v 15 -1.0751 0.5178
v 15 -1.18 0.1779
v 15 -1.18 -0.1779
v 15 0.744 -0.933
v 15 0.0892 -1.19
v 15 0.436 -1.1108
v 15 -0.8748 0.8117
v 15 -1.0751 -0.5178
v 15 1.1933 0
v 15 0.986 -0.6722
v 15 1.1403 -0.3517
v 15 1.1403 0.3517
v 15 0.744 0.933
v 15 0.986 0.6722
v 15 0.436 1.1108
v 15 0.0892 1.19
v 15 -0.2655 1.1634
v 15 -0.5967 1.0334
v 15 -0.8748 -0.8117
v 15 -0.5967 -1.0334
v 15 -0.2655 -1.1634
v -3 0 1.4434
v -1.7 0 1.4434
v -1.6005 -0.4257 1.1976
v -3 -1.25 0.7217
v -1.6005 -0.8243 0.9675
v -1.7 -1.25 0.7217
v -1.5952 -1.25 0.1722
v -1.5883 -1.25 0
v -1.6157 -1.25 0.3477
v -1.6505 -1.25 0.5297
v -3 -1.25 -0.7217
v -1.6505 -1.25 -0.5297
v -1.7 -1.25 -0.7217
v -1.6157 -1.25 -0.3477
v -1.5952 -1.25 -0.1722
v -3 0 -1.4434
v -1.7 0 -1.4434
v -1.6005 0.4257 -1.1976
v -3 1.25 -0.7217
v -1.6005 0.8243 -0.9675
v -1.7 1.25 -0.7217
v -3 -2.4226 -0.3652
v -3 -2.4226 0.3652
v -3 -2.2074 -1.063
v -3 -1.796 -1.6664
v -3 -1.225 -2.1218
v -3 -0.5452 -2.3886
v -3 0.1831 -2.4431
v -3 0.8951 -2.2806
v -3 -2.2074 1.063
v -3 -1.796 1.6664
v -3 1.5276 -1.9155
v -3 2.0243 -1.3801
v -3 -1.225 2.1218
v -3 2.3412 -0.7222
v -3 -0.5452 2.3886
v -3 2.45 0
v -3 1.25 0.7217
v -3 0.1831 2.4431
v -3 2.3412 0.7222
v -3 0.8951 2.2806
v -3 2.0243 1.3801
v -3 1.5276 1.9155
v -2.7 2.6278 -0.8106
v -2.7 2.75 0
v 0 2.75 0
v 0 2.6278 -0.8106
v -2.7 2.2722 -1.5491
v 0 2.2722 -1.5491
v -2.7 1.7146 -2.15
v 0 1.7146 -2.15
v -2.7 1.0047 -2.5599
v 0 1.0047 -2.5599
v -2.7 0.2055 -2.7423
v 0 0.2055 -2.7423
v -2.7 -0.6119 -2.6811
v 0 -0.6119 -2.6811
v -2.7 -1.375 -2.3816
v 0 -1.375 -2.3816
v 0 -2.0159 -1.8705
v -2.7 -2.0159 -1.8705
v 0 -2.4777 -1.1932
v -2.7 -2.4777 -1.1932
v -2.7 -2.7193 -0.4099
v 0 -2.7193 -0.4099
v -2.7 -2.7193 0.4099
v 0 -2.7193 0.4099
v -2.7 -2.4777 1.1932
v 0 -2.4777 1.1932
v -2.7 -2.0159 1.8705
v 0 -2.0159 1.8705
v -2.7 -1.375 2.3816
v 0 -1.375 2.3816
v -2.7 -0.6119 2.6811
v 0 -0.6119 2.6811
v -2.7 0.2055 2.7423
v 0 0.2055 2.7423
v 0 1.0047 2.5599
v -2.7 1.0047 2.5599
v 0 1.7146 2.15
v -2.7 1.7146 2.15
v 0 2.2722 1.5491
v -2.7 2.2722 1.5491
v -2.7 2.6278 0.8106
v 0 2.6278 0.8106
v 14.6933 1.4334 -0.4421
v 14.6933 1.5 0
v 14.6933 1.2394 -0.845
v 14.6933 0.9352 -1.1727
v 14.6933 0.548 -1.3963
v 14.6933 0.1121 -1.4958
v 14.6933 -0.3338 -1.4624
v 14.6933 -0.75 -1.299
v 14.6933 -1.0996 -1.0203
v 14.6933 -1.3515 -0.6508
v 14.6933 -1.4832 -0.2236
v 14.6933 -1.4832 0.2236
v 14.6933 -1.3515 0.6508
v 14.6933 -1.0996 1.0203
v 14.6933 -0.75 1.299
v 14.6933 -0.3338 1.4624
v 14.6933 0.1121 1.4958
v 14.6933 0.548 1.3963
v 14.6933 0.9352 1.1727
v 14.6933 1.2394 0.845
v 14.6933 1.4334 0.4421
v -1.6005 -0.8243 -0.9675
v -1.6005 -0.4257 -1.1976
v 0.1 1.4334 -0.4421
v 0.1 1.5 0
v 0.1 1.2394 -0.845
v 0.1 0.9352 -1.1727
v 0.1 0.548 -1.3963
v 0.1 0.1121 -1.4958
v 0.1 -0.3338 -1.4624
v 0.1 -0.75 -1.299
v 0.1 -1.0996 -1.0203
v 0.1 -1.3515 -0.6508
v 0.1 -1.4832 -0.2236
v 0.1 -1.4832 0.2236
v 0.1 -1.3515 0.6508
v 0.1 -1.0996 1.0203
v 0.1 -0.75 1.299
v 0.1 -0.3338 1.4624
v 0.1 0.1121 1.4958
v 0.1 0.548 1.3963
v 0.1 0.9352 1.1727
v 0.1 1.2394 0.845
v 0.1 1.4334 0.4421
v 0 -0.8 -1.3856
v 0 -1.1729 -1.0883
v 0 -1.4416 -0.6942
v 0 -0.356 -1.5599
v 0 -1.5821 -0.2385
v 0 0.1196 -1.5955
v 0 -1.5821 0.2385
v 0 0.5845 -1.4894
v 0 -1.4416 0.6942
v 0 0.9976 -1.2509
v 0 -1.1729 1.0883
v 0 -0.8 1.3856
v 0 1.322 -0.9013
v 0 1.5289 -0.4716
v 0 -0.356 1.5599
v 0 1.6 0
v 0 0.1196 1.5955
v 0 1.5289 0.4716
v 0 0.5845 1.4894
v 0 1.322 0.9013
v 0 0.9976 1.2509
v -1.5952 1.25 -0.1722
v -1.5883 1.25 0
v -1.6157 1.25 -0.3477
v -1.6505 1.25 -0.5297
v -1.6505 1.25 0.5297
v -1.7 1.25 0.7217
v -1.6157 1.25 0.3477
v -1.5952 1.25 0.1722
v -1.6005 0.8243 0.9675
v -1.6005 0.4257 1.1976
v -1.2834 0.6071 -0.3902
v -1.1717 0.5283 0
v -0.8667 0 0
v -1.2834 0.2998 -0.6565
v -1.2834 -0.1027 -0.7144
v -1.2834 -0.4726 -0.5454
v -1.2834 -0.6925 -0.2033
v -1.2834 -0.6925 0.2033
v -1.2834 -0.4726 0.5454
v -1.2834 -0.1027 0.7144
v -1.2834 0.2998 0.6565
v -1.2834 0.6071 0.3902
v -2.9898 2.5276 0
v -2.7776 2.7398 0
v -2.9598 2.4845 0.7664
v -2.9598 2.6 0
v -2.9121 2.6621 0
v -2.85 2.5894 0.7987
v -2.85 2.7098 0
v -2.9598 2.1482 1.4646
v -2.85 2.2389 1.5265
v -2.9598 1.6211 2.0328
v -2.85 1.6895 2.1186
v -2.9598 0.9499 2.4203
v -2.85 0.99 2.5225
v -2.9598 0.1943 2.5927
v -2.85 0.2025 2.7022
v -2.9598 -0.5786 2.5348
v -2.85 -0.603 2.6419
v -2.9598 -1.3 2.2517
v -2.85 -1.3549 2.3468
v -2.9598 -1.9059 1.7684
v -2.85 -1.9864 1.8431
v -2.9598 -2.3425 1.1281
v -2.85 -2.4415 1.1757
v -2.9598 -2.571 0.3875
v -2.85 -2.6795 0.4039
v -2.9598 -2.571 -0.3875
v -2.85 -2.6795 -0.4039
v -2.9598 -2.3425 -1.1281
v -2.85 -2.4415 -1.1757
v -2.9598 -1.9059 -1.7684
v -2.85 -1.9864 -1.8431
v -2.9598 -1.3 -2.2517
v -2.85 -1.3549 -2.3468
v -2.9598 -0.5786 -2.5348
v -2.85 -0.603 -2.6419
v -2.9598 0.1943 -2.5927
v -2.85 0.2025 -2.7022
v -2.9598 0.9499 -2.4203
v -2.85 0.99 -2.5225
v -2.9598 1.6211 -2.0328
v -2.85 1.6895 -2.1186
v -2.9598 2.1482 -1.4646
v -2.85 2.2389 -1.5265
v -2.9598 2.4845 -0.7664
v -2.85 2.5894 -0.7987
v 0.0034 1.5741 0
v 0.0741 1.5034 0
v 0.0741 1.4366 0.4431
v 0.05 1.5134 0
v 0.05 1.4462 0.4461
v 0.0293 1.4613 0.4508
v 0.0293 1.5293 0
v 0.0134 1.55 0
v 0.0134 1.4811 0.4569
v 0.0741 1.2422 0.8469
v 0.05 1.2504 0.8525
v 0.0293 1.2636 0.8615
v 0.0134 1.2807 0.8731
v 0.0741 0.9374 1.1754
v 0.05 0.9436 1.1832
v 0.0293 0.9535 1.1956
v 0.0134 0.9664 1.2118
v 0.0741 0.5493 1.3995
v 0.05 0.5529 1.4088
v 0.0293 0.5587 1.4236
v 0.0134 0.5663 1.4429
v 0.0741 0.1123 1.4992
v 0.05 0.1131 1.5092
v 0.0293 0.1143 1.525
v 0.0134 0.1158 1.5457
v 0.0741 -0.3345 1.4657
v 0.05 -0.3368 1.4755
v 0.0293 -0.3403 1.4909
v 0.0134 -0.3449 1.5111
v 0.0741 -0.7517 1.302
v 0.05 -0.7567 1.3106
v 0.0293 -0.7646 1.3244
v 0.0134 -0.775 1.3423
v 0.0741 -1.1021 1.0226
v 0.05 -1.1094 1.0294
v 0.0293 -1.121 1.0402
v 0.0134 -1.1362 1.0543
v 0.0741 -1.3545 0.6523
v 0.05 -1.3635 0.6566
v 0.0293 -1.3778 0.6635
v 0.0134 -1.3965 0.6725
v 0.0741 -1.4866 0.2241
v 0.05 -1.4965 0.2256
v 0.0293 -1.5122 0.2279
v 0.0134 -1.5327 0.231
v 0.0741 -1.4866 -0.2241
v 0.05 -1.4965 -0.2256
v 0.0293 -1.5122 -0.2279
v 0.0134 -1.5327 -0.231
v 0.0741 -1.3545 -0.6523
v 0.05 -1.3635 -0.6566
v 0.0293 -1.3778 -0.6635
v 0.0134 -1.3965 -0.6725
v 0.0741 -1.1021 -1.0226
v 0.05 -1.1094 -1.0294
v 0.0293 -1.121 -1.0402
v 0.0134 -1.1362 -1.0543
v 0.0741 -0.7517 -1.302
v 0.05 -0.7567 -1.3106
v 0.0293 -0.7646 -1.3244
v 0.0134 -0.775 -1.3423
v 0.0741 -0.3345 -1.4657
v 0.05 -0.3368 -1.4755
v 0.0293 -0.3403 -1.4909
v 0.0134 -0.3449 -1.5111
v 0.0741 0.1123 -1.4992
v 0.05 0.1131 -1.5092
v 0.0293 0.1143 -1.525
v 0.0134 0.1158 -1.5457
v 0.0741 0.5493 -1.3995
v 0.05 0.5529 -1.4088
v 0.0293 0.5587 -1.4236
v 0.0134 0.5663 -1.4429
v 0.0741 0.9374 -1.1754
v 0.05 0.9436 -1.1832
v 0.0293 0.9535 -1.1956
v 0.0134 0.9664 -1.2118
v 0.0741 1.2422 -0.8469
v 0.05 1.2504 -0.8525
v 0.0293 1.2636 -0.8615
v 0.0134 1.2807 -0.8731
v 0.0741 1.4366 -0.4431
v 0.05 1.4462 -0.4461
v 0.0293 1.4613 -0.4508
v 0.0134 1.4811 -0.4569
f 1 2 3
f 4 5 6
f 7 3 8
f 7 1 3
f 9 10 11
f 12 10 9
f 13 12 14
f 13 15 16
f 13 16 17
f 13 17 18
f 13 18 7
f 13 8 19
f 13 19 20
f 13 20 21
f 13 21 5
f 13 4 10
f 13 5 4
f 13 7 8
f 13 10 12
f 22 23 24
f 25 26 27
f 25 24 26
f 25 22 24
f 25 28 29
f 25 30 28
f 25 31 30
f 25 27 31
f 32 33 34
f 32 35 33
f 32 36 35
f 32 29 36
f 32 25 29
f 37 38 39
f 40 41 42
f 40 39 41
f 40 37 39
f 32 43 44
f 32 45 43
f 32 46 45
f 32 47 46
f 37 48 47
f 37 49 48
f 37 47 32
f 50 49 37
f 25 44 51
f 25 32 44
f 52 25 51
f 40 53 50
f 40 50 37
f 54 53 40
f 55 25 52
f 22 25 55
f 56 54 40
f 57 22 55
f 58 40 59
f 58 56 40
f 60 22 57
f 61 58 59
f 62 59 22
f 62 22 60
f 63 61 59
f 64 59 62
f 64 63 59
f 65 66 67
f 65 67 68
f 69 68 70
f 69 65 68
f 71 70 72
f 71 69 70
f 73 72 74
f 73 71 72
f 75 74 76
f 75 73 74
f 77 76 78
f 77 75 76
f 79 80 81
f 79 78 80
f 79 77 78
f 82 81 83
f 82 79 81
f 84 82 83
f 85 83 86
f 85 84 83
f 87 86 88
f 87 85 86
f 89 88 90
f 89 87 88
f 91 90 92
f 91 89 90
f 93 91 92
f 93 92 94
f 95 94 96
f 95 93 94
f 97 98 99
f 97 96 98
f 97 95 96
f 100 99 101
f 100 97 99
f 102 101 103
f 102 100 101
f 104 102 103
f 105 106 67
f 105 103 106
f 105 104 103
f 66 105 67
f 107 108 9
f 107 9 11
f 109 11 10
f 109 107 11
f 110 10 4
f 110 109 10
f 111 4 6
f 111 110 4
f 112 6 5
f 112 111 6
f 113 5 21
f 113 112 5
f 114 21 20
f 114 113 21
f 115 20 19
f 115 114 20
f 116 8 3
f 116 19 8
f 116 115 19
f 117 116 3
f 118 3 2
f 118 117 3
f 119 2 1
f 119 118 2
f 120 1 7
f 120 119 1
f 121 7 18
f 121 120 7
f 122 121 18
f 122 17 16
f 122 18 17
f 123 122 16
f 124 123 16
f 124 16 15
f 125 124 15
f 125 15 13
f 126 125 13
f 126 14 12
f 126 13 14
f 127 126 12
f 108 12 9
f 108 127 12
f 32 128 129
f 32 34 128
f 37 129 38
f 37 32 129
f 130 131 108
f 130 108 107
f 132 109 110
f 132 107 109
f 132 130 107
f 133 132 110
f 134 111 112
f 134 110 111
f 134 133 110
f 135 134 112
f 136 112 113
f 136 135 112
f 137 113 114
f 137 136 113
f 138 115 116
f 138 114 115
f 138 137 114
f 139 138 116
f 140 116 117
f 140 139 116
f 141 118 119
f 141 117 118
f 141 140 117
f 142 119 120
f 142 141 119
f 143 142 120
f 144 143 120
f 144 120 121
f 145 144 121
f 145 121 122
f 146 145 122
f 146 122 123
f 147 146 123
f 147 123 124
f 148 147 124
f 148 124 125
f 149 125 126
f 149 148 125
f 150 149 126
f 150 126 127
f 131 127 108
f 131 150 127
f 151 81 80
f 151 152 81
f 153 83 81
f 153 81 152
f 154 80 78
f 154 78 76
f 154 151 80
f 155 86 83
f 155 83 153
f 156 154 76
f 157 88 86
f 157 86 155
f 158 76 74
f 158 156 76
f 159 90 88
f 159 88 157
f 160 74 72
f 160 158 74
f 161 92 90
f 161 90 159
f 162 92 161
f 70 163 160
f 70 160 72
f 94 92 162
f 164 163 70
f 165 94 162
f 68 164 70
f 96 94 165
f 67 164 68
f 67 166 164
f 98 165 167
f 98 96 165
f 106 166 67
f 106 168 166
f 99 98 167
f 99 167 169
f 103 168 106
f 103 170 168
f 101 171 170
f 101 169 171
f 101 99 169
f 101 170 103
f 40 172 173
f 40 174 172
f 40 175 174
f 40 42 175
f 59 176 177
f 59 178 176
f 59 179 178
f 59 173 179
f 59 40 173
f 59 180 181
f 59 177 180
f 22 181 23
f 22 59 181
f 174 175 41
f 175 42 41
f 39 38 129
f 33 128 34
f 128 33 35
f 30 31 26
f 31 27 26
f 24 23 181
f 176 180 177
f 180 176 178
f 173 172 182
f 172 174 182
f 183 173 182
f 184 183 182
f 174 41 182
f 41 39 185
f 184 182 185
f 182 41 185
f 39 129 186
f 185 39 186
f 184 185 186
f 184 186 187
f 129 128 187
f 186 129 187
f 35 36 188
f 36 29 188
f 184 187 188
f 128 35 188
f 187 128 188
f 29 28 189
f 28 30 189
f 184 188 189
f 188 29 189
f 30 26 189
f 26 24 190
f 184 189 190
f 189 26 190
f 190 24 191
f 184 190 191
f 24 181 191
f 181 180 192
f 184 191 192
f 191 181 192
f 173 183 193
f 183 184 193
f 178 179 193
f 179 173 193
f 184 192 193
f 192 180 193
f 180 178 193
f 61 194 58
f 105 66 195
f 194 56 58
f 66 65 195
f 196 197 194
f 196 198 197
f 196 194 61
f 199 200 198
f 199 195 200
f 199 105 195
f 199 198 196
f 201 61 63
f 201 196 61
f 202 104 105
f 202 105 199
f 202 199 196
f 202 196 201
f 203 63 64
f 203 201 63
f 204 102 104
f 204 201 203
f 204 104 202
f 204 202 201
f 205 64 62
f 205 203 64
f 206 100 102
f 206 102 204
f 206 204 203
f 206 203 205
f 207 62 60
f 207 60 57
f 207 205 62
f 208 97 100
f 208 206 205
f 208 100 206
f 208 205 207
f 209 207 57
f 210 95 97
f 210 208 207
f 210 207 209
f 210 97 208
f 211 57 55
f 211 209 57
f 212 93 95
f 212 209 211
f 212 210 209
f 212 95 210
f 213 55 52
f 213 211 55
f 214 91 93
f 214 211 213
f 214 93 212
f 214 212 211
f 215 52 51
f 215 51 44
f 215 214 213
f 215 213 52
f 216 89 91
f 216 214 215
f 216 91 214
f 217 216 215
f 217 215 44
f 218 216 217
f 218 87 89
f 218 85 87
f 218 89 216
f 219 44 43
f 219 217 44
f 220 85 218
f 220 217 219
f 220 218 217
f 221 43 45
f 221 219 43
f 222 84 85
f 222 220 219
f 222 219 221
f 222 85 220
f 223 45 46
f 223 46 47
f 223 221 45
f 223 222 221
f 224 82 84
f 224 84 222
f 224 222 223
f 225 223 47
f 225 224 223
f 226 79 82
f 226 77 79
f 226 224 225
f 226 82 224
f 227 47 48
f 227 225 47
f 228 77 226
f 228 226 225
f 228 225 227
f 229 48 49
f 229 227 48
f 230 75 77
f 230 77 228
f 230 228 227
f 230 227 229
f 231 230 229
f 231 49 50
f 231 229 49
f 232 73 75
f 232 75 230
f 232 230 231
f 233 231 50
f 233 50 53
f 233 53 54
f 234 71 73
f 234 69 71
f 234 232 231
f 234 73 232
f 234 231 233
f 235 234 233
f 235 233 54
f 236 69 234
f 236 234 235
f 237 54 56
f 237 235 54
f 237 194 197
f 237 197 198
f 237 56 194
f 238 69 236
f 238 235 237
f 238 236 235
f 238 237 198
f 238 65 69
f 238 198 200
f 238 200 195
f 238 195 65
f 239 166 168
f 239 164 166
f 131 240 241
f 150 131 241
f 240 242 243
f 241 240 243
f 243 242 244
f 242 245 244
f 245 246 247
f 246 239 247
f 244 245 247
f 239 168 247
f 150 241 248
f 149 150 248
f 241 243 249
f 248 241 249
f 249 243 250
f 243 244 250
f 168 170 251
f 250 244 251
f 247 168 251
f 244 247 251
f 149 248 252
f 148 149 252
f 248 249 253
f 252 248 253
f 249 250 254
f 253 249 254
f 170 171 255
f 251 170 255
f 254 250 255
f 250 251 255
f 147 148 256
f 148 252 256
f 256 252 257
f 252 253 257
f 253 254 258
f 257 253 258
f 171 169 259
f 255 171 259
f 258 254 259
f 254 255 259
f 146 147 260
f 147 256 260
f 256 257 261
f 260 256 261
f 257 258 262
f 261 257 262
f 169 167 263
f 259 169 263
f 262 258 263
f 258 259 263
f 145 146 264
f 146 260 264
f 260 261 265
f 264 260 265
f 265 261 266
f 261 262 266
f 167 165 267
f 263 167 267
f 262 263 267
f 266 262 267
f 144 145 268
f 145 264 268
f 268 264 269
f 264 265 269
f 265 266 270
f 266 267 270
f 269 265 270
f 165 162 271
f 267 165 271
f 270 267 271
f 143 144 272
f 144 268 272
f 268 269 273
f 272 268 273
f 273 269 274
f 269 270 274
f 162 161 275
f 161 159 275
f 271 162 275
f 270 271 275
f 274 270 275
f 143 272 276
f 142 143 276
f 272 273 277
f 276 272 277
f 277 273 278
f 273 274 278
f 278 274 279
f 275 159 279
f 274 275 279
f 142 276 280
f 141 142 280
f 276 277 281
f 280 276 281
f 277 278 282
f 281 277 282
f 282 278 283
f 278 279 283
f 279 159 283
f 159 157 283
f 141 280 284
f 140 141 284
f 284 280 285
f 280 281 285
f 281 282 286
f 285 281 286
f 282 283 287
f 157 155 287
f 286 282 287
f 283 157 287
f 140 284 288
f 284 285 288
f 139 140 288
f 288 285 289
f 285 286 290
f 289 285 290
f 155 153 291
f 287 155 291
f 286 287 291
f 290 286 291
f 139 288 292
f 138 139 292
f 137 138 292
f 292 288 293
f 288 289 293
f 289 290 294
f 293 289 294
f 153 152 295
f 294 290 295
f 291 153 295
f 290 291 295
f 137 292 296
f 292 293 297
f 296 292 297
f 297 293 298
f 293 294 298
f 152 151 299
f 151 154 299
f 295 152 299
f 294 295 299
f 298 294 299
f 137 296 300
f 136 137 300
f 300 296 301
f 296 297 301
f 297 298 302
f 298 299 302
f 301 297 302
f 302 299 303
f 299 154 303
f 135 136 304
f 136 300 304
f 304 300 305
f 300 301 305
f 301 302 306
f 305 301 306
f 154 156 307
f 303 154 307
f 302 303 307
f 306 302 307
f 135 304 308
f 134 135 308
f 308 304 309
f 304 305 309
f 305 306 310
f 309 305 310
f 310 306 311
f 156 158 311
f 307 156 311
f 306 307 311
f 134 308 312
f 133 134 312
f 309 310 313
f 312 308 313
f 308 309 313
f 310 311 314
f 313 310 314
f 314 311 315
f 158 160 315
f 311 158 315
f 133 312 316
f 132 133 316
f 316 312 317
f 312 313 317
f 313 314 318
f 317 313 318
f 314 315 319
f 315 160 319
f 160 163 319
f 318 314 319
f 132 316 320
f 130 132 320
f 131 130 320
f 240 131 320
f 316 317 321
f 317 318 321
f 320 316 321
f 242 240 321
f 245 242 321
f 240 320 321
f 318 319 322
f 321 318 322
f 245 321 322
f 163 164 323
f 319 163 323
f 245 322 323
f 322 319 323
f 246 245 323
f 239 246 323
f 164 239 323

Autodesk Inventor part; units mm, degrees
ref_plane "YZ Plane" through (0, 0, 0) normal (1, 0, 0) x (0, 1, 0)
ref_plane "XZ Plane" through (0, 0, 0) normal (0, 1, 0) x (-1, 0, 0)
sketch "Sketch1" plane through (0, 0, 0) normal (0, 0, 1) x (1, 0, 0)
  line L0 (-0.8667, 0) -> (15, 0)
  line L1 (15, 0) -> (15, 1.5)
  line L2 (15, 1.5) -> (4.25, 1.5)
  line L3 (4.25, 1.5) -> (3.9432, 1.5)
  line L4 (3.9432, 1.5) -> (0, 1.5)
  line L5 (0, 1.5) -> (0, 2.75)
  line L6 (0, 2.75) -> (-3, 2.75)
  line L7 (-3, 2.75) -> (-3, 1.4434)
  line L8 (-3, 1.4434) -> (-1.7, 1.4434)
  line L9 (-1.7, 1.4434) -> (-0.8667, 0)
  line L10 (-6.6, 0) -> (18.6, 0) projected
  line L11 (0, -0.55) -> (0, 3.3) projected
  line L12 (4.25, 1.5) -> (0, 1.5) construction
  dimension "d1" = 10.75
  dimension "d2" = 0.3068
  dimension "d3" = 3
  dimension "d4" = 1.3
  dimension "d5" = 60
  dimension "d6" = 3
  dimension "d7" = 3
  dimension "d8" = 2.8868
  dimension "d9" = 5.5
  dimension "d26" = 15
revolve "Body" add sketch "Sketch1" angle 360 about axis through (-0.8667, 0, 0) along (1, 0, 0)
sketch "Sketch2" plane through (-3, 0, 0) normal (-1, 0, 0) x (0, 0, 1)
  circle A0 centre (0, 0) radius 1.4434 projected
  line L0 (0, -3.85) -> (0, 3.85) projected
  line L1 (-3.85, 0) -> (3.85, 0) projected
  line L2 (1.4434, 0) -> (0.7217, -1.25)
  line L3 (0.7217, -1.25) -> (-0.7217, -1.25)
  line L4 (-0.7217, -1.25) -> (-1.4434, 0)
  line L5 (-1.4434, 0) -> (-0.7217, 1.25)
  line L6 (-0.7217, 1.25) -> (0.7217, 1.25)
  line L7 (0.7217, 1.25) -> (1.4434, 0)
  point P0 (0, 0)
extrude "Slot" add sketch "Sketch2" against normal up to next contours L7 A0 | A0 L2 | L6 L0 A0 | A0 L0 L3 | L0 L6 A0 | A0 L3 L0 | L4 A0 | A0 L5
fillet "Fillet1" radius 0.3 1 edges at (-3, -2.75, 0)
thread "Thread" size "M3x0.5" class "6g" standard "ISO Metric profile" length 10.75
chamfer "Chamfer1" distance 0.3067 distance2 0.3067 1 edges at (15, -1.5, 0) measured on face at (15, 0.5539, 0.4443)
ref_plane "Work Plane1" through (29, 0, 0) normal (0, -1, 0) x (1, 0, 0)
fillet "Fillet2" radius 0.1 1 edges at (0, -1.5, 0)
equation "\"d1\" = GEL"
equation "\"d3\" = KOH"
equation "\"d4\" = INTI"
equation "\"d6\" = GD"
equation "\"d7\" = BDM"
equation "\"d8\" = 1.1547 * SW"
equation "\"d9\" = KOD"
equation "\"d30\" = R"
equation "\"d17\" = RR"
equation "\"d13\" = GEL"
equation "\"d15\" = -0.5 * SPD + 0.5 * GD"
equation "\"d16\" = GUL"
equation "\"GD\" = NND"
equation "\"NLG\" = 12"
equation "\"GEL\" = 10.75"
equation "\"KOD\" = 5.5"
equation "\"KOH\" = NND"
equation "\"INTI\" = 1.3"
equation "\"GAL\" = 0.61345 * PTC"
equation "\"GUL\" = 0.61345 * PTC"
equation "\"BDM\" = NND"
equation "\"SW\" = 2.5"
equation "\"RR\" = 0.1 * NND"
equation "\"SPD\" = NND - 1.2269 * PTC"
equation "\"R\" = 0.1"
equation "\"PHH\" = 0.13"
equation "\"GD1\" = THREADDIA - 1.2269 * PTC"
equation "\"THREADDIA\" = 3"
equation "\"FAWI\" = 45deg"
equation "\"PTC\" = 0.5"
equation "\"KOH1\" = 2.7"
equation "\"NND\" = 3"
equation "\"TOA\" = 30deg"
equation "\"E0\" = 1.155 * SW"
properties part number "F105" material "Steel, Mild"
